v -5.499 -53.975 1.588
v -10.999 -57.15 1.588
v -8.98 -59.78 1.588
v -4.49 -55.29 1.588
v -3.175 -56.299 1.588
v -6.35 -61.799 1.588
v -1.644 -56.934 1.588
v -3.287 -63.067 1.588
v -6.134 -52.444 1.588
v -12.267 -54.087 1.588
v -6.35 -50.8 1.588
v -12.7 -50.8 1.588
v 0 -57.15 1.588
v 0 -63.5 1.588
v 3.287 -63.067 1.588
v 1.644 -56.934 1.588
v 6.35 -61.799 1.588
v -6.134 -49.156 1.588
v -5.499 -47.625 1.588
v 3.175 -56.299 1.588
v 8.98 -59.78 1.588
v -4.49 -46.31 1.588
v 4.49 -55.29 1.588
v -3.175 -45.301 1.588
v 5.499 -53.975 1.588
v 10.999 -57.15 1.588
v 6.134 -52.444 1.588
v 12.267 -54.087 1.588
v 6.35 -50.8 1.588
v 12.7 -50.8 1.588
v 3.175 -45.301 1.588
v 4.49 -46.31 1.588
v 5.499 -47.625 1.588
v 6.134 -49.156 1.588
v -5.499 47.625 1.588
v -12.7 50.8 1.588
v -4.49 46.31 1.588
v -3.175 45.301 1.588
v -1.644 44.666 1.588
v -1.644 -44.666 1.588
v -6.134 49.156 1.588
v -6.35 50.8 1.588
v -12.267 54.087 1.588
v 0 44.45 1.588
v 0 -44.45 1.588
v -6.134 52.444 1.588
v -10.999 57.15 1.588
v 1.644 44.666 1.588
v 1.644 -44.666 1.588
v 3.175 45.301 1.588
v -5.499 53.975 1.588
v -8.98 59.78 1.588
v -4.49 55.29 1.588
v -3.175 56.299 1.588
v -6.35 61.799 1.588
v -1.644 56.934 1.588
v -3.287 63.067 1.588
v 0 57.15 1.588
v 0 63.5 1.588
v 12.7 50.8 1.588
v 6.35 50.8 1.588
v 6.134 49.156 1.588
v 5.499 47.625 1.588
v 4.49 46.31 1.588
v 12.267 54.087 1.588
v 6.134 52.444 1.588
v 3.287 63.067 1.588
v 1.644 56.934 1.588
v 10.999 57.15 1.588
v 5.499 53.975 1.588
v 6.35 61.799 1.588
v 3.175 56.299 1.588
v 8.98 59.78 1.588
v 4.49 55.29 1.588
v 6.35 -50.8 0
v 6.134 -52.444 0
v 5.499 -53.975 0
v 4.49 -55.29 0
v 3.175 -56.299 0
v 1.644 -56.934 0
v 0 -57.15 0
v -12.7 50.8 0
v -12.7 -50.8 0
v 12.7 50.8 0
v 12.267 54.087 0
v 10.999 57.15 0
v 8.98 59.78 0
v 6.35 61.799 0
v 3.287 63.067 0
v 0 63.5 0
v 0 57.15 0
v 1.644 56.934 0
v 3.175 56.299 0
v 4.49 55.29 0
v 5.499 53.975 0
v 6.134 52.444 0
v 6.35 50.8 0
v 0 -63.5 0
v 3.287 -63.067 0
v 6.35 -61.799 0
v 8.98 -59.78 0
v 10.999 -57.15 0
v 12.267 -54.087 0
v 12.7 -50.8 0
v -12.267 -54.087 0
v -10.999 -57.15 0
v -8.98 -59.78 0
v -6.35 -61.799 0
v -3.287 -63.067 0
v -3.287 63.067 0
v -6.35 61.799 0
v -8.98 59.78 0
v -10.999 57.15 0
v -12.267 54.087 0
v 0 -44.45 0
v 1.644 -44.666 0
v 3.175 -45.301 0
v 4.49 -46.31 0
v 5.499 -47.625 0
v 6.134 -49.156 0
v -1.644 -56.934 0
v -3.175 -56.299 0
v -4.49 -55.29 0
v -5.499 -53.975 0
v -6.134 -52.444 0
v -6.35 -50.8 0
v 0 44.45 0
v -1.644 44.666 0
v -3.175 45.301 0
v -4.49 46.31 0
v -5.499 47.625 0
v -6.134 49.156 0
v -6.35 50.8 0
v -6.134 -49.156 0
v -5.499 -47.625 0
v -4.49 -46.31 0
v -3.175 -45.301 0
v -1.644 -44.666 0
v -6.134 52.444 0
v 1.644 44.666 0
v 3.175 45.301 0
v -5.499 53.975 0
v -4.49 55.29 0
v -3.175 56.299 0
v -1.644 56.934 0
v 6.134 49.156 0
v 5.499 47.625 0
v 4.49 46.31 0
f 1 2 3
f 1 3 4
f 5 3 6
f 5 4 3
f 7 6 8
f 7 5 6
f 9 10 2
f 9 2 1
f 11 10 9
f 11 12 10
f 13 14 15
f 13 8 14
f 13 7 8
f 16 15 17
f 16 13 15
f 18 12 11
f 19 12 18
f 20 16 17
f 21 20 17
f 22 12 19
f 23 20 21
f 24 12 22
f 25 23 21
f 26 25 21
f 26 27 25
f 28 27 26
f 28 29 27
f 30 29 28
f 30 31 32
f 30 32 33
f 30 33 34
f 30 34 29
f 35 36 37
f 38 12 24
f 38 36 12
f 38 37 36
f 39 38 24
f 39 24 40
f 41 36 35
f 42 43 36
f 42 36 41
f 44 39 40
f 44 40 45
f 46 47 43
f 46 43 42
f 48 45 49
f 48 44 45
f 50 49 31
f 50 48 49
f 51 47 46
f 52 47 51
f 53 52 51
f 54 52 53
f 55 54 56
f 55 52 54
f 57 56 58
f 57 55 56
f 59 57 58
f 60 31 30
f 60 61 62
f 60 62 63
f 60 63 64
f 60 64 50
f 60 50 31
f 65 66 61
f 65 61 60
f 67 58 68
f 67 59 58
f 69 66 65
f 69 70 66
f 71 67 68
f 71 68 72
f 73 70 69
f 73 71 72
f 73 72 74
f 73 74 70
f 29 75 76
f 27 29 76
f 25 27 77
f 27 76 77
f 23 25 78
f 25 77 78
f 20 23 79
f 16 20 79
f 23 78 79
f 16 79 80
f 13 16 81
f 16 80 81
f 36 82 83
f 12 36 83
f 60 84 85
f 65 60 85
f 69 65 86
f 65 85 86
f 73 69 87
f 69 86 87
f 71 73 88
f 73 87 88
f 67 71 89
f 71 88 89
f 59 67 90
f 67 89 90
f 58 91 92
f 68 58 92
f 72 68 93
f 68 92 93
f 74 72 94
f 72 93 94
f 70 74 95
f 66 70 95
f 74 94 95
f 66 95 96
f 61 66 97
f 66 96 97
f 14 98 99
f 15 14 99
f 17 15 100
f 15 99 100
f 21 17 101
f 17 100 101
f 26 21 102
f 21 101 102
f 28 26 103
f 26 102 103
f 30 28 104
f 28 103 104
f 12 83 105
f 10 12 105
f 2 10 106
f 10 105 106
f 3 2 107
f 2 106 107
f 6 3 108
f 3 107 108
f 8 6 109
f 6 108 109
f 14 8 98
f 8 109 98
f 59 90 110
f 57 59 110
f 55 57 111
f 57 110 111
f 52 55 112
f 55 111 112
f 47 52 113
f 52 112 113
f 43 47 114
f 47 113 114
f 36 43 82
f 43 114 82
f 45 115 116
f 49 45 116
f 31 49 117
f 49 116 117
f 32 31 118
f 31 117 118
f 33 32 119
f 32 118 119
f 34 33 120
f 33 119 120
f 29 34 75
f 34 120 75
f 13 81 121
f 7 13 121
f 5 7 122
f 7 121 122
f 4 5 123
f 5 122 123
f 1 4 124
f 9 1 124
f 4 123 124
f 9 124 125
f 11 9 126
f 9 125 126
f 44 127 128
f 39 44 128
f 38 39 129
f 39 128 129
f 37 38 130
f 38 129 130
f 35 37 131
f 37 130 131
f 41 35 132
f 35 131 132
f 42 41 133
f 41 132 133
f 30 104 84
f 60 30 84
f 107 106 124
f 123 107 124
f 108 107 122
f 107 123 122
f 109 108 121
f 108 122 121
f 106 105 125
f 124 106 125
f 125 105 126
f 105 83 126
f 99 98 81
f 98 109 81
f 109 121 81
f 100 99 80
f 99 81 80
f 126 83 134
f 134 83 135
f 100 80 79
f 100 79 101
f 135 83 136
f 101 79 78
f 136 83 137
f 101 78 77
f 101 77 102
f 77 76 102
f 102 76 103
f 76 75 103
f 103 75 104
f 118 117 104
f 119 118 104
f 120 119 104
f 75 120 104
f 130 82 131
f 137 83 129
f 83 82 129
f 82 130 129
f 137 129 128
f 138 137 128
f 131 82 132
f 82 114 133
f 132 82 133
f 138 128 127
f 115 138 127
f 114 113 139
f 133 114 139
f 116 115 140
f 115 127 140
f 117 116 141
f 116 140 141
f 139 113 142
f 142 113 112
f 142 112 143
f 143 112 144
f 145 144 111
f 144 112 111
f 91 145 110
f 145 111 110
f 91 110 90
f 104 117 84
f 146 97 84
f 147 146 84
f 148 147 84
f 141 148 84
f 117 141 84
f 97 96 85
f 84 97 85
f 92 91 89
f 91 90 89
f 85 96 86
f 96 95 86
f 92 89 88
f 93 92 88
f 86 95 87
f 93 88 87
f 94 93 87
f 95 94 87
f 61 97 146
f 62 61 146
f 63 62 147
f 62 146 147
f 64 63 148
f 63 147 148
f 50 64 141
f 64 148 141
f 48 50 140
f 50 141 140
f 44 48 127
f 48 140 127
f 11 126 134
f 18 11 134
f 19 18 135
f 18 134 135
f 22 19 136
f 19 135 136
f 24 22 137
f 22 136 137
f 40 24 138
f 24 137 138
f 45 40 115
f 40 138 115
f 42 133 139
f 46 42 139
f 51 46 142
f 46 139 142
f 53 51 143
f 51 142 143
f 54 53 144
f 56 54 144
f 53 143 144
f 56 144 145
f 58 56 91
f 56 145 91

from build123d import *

# Parameters (mm, degrees)
F1_DEPTH = 1.5875


with BuildPart() as f1:
    # F0 (on Top) → F1 (new body)
    with BuildSketch(Plane.XY):
        with BuildLine():
            ThreePointArc((0, 57.15), (4.490128, 55.290128), (6.35, 50.8))
            Line((6.35, 50.8), (12.7, 50.8))
            ThreePointArc((12.7, 50.8), (8.980256, 59.780256), (0, 63.5))
            Line((0, 63.5), (0, 57.15))
        make_face()
        with BuildLine():
            Line((12.7, 50.8), (6.35, 50.8))
            ThreePointArc((6.35, 50.8), (4.490128, 46.309872), (0, 44.45))
            Line((0, 44.45), (0, -44.45))
            ThreePointArc((0, -44.45), (4.490128, -46.309872), (6.35, -50.8))
            Line((6.35, -50.8), (12.7, -50.8))
            Line((12.7, -50.8), (12.7, 50.8))
        make_face()
        with BuildLine():
            ThreePointArc((-6.35, 50.8), (-4.490128, 55.290128), (0, 57.15))
            Line((0, 57.15), (0, 63.5))
            ThreePointArc((0, 63.5), (-8.980256, 59.780256), (-12.7, 50.8))
            Line((-12.7, 50.8), (-6.35, 50.8))
        make_face()
        with BuildLine():
            Line((0, -44.45), (0, 44.45))
            ThreePointArc((0, 44.45), (-4.490128, 46.309872), (-6.35, 50.8))
            Line((-6.35, 50.8), (-12.7, 50.8))
            Line((-12.7, 50.8), (-12.7, -50.8))
            Line((-12.7, -50.8), (-6.35, -50.8))
            ThreePointArc((-6.35, -50.8), (-4.490128, -46.309872), (0, -44.45))
        make_face()
        with BuildLine():
            ThreePointArc((0, -63.5), (8.980256, -59.780256), (12.7, -50.8))
            Line((12.7, -50.8), (6.35, -50.8))
            ThreePointArc((6.35, -50.8), (4.490128, -55.290128), (0, -57.15))
            Line((0, -57.15), (0, -63.5))
        make_face()
        with BuildLine():
            ThreePointArc((-12.7, -50.8), (-8.980256, -59.780256), (0, -63.5))
            Line((0, -63.5), (0, -57.15))
            ThreePointArc((0, -57.15), (-4.490128, -55.290128), (-6.35, -50.8))
            Line((-6.35, -50.8), (-12.7, -50.8))
        make_face()
    extrude(amount=F1_DEPTH)


solid = f1.part
